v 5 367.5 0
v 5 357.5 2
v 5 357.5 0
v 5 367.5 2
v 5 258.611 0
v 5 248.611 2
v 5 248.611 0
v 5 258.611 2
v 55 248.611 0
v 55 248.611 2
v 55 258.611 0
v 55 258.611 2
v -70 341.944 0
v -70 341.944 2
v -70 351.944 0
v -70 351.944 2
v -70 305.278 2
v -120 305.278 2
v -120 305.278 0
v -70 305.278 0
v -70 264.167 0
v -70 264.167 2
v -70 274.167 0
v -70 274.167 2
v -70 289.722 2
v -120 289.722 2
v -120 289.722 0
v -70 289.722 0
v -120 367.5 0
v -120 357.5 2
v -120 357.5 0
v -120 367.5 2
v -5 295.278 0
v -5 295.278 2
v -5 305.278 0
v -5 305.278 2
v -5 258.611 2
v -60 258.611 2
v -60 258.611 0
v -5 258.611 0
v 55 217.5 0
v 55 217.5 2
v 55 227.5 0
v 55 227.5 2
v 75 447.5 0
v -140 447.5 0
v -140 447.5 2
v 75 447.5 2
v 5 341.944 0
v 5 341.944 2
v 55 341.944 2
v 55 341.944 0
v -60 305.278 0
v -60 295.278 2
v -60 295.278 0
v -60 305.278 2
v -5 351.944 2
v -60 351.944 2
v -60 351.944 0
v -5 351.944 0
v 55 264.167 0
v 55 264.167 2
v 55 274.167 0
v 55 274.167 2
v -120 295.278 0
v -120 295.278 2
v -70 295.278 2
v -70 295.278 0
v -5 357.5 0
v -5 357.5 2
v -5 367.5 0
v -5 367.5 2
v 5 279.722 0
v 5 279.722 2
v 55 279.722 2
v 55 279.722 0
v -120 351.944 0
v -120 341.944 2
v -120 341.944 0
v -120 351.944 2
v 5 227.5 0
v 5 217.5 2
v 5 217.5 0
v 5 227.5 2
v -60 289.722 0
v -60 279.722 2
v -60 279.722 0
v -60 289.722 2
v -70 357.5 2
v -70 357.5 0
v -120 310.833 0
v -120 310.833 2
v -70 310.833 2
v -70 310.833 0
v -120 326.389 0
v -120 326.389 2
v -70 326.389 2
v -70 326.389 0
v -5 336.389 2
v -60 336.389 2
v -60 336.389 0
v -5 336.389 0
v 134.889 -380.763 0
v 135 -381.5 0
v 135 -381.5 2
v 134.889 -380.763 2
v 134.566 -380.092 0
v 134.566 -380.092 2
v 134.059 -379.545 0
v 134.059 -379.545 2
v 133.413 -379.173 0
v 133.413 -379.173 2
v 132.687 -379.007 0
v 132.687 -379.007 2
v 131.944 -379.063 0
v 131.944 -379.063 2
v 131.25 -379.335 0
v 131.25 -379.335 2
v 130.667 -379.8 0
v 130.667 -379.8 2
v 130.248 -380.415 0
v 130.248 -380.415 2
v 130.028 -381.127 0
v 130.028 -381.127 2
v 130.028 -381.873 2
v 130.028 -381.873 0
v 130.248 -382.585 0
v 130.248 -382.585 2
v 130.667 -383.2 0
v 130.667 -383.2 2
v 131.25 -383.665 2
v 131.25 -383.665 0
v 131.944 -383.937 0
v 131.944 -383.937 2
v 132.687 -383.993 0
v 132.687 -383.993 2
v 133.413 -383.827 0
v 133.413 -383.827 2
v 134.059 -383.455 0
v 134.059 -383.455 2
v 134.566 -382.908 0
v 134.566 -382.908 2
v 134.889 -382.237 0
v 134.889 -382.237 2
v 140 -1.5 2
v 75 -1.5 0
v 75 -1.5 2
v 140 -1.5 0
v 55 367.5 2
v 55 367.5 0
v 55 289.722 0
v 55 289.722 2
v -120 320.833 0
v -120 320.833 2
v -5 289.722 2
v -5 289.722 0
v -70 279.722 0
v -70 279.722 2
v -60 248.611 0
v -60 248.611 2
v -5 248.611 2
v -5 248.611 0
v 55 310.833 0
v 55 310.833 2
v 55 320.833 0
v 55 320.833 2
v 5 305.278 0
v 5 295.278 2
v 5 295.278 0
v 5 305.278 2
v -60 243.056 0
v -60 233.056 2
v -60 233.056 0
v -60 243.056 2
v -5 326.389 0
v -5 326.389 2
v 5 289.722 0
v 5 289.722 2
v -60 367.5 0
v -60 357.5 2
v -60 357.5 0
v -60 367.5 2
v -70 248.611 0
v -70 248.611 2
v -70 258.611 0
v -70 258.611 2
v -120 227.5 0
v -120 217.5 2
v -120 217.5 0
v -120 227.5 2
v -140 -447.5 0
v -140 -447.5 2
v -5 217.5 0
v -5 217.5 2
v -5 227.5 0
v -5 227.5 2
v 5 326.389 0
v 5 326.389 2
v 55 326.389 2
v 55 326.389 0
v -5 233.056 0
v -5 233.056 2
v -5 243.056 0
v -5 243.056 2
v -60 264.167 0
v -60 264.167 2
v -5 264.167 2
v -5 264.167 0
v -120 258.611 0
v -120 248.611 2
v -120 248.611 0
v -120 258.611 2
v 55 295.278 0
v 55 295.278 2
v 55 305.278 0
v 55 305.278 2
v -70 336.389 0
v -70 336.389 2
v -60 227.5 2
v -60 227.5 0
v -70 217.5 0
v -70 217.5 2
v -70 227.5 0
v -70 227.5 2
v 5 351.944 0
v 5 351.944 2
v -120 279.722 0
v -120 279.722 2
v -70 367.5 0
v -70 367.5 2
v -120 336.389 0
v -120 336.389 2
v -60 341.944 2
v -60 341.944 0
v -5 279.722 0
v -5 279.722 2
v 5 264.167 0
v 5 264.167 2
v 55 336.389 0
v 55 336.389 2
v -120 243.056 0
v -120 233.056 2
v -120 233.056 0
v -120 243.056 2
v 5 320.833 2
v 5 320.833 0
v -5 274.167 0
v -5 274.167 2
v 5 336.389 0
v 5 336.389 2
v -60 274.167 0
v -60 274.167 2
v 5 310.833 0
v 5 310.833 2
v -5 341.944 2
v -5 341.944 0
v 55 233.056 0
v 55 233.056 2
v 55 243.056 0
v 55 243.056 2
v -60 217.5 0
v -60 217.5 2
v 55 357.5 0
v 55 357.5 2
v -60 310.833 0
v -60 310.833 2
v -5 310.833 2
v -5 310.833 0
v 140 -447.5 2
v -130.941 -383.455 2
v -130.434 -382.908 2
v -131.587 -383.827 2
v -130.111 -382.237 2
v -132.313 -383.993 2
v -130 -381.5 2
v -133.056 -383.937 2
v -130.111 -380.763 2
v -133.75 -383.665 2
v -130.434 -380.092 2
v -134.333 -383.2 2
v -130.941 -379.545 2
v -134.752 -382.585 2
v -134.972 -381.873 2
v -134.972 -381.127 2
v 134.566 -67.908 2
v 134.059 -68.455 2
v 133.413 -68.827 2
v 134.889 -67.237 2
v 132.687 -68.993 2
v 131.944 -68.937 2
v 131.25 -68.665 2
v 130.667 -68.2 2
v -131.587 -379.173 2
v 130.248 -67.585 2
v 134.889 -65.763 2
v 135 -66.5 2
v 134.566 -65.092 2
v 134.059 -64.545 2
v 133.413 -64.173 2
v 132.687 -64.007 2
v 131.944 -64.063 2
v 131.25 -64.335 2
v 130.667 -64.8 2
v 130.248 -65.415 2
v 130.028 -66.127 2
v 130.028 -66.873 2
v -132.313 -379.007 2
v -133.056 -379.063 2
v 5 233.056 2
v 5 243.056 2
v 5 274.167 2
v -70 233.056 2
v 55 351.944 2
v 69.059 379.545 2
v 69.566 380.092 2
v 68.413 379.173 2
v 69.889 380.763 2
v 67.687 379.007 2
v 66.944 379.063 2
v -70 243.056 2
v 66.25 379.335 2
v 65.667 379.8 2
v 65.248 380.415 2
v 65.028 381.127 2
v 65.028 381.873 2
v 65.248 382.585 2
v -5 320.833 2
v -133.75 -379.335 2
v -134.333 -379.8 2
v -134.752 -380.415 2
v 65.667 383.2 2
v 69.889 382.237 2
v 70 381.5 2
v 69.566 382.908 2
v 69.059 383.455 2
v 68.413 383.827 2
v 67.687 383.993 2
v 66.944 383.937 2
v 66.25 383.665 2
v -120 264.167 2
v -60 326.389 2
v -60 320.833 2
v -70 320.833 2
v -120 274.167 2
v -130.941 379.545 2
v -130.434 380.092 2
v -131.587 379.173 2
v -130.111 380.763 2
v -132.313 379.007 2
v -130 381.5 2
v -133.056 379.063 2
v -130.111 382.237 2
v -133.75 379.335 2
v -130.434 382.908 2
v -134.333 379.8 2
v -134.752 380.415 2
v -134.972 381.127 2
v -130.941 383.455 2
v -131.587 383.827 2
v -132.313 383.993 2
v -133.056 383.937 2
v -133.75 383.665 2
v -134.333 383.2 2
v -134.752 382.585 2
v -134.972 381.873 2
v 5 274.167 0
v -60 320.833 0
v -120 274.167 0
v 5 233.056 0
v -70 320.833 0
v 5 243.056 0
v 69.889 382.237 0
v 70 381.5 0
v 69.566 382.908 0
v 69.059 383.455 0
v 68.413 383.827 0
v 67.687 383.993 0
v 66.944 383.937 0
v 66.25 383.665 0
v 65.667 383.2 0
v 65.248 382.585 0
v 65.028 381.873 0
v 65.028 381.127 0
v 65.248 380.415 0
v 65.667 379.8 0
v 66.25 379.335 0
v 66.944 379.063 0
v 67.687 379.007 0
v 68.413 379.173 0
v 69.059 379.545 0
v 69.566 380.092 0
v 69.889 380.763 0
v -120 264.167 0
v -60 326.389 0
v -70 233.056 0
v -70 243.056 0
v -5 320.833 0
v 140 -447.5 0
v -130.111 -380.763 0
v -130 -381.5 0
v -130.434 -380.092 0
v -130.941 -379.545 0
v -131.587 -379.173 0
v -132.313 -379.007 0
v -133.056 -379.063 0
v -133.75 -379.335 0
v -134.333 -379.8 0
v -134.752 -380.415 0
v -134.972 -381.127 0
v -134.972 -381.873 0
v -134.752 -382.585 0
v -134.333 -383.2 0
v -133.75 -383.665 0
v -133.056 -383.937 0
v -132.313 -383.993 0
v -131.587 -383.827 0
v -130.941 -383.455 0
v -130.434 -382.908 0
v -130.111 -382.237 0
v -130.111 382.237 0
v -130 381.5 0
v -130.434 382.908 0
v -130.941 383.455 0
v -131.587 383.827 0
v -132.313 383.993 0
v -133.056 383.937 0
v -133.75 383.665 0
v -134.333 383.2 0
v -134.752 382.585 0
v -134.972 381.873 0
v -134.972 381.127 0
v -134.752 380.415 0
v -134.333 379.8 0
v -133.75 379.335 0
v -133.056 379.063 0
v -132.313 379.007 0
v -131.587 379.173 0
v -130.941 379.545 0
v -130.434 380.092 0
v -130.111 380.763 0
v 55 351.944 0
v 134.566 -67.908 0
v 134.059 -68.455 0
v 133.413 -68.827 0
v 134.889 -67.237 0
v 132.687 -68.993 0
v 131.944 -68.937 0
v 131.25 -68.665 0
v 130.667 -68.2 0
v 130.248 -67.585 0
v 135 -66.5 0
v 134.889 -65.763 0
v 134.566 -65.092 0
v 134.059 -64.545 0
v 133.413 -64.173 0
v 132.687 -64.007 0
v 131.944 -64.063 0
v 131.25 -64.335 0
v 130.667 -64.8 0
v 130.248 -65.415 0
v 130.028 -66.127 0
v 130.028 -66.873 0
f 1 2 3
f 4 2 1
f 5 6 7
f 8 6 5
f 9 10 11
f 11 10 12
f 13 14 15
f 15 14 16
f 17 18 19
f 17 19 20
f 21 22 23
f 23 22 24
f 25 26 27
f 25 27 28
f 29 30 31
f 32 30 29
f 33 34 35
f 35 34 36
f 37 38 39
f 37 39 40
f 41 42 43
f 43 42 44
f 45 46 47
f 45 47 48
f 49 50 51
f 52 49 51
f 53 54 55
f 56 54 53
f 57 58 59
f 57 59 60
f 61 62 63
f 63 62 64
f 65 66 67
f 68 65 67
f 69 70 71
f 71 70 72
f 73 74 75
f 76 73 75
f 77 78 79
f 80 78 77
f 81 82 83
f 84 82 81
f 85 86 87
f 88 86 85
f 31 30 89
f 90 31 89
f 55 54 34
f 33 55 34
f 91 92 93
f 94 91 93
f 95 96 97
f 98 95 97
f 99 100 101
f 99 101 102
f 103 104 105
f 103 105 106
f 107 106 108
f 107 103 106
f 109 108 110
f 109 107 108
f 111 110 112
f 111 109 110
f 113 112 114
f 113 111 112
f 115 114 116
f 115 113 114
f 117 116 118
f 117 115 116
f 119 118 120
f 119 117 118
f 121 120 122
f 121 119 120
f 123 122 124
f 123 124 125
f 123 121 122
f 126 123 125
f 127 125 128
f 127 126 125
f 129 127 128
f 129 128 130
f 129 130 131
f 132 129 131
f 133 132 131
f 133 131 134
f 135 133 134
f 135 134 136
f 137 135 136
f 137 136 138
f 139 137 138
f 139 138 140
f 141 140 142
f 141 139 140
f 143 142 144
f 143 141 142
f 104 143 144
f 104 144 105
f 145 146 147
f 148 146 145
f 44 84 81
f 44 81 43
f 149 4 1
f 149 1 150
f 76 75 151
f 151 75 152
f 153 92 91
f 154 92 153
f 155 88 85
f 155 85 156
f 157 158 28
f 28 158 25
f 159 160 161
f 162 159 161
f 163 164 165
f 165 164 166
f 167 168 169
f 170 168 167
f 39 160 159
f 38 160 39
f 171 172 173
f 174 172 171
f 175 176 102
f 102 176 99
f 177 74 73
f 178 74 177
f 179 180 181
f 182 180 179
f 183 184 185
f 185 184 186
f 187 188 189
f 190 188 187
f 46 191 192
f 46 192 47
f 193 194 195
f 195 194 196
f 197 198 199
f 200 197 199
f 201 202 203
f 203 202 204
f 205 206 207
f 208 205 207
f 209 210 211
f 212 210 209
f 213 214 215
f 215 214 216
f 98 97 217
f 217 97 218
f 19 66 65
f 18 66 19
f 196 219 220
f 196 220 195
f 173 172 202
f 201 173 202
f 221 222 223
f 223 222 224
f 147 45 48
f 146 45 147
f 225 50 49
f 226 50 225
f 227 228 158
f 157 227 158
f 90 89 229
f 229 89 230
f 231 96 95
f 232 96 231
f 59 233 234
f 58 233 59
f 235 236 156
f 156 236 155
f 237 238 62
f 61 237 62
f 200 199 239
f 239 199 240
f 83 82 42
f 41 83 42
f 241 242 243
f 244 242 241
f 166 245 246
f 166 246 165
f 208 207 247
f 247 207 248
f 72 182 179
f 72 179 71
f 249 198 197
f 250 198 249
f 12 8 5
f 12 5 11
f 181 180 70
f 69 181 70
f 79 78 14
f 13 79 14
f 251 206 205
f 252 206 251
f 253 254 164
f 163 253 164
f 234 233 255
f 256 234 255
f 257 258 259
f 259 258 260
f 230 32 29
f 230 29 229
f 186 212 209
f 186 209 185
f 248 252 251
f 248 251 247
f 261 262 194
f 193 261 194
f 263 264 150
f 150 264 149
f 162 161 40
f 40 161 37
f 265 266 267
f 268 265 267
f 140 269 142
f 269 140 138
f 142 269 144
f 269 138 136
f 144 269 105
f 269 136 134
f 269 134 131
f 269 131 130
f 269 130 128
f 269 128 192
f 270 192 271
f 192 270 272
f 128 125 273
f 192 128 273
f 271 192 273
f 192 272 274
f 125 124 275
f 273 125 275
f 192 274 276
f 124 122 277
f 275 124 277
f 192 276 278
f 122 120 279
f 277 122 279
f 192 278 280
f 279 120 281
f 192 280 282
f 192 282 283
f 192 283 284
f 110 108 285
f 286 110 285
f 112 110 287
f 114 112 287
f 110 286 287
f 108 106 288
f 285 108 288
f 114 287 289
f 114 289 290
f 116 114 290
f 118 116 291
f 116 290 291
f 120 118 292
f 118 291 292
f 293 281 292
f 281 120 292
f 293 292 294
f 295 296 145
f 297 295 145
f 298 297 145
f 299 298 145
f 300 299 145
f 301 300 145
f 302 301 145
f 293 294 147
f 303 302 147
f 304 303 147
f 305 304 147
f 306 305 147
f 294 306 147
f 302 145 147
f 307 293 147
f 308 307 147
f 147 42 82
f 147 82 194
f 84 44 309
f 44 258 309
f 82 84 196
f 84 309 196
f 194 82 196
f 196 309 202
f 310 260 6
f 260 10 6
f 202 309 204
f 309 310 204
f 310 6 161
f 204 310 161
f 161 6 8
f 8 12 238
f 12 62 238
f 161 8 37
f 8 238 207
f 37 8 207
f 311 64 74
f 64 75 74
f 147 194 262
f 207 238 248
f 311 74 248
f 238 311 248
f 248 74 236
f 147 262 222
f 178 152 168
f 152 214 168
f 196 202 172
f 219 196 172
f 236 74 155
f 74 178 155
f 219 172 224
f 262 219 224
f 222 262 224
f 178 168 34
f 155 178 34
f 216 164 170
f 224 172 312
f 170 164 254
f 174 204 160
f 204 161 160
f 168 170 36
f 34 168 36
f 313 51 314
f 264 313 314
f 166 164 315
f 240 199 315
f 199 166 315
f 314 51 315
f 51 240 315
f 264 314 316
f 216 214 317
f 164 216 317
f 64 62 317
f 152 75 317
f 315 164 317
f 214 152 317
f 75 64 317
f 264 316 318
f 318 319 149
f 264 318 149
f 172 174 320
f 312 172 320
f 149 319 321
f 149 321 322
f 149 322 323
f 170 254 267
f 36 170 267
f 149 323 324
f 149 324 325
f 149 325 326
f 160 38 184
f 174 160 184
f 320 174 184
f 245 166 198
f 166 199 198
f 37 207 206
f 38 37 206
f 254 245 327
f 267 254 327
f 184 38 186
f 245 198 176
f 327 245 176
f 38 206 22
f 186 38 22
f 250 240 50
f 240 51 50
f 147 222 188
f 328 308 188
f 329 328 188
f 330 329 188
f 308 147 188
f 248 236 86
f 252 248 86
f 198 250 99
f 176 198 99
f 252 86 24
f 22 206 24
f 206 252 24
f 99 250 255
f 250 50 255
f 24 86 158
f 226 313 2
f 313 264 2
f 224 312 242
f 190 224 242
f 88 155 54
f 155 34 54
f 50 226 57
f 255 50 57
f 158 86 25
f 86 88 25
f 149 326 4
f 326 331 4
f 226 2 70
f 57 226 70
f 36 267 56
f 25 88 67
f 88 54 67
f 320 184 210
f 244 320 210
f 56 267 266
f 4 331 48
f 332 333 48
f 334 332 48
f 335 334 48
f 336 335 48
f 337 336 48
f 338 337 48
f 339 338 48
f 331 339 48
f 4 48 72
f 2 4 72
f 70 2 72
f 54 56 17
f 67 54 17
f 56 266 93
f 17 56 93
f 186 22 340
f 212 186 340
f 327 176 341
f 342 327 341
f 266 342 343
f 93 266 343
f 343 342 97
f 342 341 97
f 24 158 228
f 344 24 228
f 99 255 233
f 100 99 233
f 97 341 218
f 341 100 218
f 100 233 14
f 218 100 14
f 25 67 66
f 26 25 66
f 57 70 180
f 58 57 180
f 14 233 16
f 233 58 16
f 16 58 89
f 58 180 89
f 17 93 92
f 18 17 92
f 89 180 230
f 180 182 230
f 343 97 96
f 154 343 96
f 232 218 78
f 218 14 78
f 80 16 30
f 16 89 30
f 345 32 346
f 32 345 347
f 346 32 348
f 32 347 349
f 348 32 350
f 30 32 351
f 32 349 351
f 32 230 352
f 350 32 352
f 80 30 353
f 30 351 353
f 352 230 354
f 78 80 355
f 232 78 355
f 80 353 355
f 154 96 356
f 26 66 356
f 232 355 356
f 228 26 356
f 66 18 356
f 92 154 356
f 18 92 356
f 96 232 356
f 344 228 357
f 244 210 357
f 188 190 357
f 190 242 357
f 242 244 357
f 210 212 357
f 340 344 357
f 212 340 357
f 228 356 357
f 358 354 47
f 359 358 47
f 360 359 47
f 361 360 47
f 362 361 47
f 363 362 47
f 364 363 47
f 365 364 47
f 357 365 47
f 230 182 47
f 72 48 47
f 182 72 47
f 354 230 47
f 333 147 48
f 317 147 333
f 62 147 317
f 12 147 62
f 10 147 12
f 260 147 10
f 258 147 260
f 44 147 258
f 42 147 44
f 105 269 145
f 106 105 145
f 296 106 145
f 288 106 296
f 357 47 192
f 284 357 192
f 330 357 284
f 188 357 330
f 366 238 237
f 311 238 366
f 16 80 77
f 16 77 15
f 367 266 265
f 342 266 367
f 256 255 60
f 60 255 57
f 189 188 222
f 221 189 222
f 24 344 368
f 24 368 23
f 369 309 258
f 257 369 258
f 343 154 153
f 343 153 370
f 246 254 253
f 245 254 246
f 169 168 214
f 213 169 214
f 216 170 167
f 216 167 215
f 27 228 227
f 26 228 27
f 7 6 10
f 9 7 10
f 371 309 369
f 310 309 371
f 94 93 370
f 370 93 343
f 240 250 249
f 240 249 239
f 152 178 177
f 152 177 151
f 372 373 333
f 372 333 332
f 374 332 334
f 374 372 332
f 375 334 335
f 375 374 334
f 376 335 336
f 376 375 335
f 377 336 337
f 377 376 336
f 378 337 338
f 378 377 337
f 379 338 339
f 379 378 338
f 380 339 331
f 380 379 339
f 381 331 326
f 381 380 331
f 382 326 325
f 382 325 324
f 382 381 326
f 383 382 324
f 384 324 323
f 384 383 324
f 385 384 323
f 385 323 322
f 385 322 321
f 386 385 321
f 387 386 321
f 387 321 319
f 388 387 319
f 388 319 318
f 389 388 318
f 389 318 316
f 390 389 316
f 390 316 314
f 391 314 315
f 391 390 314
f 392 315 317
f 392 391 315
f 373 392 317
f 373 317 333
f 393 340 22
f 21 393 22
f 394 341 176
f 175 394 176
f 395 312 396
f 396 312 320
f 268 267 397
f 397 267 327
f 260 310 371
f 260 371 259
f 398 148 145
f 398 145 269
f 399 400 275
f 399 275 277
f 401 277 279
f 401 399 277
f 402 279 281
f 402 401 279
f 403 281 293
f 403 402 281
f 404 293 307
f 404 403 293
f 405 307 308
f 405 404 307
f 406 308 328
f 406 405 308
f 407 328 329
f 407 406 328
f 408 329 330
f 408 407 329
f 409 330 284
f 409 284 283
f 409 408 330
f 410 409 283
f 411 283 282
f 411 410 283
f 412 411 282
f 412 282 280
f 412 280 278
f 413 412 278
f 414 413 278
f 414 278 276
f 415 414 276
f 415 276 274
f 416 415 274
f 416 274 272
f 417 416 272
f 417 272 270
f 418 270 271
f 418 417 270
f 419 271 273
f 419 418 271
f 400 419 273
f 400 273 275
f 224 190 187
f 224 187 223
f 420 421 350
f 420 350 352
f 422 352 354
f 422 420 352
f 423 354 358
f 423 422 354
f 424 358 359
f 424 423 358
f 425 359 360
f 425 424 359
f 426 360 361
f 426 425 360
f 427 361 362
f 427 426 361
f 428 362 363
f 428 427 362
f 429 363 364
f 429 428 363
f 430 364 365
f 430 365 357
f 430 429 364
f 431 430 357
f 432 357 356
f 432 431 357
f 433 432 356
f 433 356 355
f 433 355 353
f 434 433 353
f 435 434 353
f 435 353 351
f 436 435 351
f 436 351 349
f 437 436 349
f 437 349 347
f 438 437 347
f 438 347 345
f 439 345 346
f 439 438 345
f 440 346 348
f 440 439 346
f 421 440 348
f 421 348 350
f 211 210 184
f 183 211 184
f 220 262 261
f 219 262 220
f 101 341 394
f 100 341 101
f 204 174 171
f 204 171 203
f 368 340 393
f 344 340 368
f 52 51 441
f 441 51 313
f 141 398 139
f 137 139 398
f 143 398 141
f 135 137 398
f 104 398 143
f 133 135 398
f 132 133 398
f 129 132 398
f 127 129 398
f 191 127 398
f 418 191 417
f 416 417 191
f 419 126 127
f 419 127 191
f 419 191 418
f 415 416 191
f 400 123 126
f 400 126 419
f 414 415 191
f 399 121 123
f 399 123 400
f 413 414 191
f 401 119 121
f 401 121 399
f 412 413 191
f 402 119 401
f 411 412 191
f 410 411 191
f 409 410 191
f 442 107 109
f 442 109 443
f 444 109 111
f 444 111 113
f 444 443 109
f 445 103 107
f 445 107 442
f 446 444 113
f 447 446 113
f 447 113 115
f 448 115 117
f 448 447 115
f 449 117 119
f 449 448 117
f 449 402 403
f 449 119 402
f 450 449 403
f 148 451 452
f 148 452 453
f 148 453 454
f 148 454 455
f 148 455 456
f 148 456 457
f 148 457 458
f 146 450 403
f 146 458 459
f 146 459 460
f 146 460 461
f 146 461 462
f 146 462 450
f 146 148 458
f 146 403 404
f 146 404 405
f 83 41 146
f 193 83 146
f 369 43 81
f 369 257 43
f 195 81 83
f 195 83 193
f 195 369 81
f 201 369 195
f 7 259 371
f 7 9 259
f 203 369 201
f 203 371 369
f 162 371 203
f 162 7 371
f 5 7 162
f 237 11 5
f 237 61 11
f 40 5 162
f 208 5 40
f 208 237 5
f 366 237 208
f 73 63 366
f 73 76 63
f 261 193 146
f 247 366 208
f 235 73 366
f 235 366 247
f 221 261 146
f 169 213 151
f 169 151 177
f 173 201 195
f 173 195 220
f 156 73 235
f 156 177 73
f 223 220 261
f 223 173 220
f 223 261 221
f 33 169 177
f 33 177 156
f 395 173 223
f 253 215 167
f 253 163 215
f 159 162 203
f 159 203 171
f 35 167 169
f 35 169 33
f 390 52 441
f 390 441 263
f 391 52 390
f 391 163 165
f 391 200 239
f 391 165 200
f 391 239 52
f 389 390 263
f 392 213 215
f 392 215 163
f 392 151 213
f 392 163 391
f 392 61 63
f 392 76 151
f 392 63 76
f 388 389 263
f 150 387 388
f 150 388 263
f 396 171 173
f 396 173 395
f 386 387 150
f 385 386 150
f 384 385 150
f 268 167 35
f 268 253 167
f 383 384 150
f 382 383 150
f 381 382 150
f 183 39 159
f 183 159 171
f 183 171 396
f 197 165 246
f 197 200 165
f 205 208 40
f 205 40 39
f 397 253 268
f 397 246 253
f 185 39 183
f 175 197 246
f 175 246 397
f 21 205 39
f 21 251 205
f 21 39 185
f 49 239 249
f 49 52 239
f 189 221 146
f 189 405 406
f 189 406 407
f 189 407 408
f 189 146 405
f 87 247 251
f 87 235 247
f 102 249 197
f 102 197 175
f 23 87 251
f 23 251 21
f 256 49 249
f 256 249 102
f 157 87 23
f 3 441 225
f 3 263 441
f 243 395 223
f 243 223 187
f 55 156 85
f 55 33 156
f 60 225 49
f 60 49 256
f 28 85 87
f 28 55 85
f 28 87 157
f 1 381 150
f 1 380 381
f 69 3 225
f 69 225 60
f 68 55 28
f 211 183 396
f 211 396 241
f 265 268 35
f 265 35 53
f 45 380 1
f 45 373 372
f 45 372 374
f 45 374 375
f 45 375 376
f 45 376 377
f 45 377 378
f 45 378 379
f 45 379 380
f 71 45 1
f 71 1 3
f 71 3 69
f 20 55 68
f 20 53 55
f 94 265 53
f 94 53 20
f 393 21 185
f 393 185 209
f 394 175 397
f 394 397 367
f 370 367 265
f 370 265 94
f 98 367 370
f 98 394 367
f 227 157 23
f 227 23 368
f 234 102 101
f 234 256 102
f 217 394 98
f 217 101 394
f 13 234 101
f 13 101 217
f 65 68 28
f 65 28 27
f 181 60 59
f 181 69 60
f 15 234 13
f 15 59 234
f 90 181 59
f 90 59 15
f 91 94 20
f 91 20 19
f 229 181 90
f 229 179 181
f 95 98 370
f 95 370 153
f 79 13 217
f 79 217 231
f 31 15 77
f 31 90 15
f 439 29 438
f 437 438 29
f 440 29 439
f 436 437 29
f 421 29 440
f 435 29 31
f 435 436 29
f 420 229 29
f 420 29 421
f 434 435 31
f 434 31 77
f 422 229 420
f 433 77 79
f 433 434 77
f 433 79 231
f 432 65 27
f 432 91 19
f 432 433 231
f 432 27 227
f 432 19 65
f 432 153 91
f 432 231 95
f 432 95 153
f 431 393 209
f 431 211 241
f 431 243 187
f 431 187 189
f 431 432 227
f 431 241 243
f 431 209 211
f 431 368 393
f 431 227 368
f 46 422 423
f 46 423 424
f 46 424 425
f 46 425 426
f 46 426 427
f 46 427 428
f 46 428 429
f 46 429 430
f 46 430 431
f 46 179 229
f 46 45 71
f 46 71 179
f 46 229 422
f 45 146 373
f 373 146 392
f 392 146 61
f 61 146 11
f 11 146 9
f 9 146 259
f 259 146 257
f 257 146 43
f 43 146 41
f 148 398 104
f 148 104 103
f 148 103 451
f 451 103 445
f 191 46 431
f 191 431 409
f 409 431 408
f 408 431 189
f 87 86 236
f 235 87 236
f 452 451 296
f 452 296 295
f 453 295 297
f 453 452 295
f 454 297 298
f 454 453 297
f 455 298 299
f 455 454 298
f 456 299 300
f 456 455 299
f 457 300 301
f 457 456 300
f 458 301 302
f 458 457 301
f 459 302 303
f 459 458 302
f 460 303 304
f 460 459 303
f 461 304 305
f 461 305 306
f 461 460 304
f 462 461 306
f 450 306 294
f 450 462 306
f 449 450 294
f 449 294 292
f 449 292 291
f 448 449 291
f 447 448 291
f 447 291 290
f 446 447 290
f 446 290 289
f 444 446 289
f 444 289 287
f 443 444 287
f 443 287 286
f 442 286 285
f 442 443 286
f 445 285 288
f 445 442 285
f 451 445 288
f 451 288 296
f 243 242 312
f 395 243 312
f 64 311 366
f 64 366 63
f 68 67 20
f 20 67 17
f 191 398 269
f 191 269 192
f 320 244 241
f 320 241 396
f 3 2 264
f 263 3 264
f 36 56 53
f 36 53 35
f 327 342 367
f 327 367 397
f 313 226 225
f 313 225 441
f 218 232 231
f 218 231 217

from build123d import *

# Parameters (mm, degrees)
SKETCH_R            = 2.5
PAD_DEPTH           = 2
SKETCH001_W         = 50
SKETCH001_H         = 10
SKETCH001_W_2       = 55
POCKET_DEPTH        = 5
LINEARPATTERN_COUNT = 10
LINEARPATTERN_PITCH = 15.555556


with BuildPart() as part:
    # Sketch → Pad (new body)
    with BuildSketch(Plane.XY):
        Polygon((-140, 447.5), (75, 447.5), (75, -1.5), (140, -1.5), (140, -447.5), (-140, -447.5), align=None)
        with Locations((-132.5, 381.5)):
            Circle(SKETCH_R, mode=Mode.SUBTRACT)
        with Locations((67.5, 381.5)):
            Circle(SKETCH_R, mode=Mode.SUBTRACT)
        with Locations((132.5, -66.5)):
            Circle(SKETCH_R, mode=Mode.SUBTRACT)
        with Locations((132.5, -381.5)):
            Circle(SKETCH_R, mode=Mode.SUBTRACT)
        with Locations((-132.5, -381.5)):
            Circle(SKETCH_R, mode=Mode.SUBTRACT)
    extrude(amount=PAD_DEPTH)

    # Sketch001 → Pocket (cut)
    with BuildSketch(Plane.XY.offset(2)):
        with Locations((-95, 362.5)):
            Rectangle(SKETCH001_W, SKETCH001_H)
        with Locations((30, 362.5)):
            Rectangle(SKETCH001_W, SKETCH001_H)
        with Locations((-32.5, 362.5)):
            Rectangle(SKETCH001_W_2, SKETCH001_H)
    pocket = extrude(amount=-POCKET_DEPTH, mode=Mode.SUBTRACT)

    # LinearPattern: Pocket ×10
    with Locations(*[(0, -i * LINEARPATTERN_PITCH, 0) for i in range(1, LINEARPATTERN_COUNT)]):
        add(pocket, mode=Mode.SUBTRACT)


solid = part.part
